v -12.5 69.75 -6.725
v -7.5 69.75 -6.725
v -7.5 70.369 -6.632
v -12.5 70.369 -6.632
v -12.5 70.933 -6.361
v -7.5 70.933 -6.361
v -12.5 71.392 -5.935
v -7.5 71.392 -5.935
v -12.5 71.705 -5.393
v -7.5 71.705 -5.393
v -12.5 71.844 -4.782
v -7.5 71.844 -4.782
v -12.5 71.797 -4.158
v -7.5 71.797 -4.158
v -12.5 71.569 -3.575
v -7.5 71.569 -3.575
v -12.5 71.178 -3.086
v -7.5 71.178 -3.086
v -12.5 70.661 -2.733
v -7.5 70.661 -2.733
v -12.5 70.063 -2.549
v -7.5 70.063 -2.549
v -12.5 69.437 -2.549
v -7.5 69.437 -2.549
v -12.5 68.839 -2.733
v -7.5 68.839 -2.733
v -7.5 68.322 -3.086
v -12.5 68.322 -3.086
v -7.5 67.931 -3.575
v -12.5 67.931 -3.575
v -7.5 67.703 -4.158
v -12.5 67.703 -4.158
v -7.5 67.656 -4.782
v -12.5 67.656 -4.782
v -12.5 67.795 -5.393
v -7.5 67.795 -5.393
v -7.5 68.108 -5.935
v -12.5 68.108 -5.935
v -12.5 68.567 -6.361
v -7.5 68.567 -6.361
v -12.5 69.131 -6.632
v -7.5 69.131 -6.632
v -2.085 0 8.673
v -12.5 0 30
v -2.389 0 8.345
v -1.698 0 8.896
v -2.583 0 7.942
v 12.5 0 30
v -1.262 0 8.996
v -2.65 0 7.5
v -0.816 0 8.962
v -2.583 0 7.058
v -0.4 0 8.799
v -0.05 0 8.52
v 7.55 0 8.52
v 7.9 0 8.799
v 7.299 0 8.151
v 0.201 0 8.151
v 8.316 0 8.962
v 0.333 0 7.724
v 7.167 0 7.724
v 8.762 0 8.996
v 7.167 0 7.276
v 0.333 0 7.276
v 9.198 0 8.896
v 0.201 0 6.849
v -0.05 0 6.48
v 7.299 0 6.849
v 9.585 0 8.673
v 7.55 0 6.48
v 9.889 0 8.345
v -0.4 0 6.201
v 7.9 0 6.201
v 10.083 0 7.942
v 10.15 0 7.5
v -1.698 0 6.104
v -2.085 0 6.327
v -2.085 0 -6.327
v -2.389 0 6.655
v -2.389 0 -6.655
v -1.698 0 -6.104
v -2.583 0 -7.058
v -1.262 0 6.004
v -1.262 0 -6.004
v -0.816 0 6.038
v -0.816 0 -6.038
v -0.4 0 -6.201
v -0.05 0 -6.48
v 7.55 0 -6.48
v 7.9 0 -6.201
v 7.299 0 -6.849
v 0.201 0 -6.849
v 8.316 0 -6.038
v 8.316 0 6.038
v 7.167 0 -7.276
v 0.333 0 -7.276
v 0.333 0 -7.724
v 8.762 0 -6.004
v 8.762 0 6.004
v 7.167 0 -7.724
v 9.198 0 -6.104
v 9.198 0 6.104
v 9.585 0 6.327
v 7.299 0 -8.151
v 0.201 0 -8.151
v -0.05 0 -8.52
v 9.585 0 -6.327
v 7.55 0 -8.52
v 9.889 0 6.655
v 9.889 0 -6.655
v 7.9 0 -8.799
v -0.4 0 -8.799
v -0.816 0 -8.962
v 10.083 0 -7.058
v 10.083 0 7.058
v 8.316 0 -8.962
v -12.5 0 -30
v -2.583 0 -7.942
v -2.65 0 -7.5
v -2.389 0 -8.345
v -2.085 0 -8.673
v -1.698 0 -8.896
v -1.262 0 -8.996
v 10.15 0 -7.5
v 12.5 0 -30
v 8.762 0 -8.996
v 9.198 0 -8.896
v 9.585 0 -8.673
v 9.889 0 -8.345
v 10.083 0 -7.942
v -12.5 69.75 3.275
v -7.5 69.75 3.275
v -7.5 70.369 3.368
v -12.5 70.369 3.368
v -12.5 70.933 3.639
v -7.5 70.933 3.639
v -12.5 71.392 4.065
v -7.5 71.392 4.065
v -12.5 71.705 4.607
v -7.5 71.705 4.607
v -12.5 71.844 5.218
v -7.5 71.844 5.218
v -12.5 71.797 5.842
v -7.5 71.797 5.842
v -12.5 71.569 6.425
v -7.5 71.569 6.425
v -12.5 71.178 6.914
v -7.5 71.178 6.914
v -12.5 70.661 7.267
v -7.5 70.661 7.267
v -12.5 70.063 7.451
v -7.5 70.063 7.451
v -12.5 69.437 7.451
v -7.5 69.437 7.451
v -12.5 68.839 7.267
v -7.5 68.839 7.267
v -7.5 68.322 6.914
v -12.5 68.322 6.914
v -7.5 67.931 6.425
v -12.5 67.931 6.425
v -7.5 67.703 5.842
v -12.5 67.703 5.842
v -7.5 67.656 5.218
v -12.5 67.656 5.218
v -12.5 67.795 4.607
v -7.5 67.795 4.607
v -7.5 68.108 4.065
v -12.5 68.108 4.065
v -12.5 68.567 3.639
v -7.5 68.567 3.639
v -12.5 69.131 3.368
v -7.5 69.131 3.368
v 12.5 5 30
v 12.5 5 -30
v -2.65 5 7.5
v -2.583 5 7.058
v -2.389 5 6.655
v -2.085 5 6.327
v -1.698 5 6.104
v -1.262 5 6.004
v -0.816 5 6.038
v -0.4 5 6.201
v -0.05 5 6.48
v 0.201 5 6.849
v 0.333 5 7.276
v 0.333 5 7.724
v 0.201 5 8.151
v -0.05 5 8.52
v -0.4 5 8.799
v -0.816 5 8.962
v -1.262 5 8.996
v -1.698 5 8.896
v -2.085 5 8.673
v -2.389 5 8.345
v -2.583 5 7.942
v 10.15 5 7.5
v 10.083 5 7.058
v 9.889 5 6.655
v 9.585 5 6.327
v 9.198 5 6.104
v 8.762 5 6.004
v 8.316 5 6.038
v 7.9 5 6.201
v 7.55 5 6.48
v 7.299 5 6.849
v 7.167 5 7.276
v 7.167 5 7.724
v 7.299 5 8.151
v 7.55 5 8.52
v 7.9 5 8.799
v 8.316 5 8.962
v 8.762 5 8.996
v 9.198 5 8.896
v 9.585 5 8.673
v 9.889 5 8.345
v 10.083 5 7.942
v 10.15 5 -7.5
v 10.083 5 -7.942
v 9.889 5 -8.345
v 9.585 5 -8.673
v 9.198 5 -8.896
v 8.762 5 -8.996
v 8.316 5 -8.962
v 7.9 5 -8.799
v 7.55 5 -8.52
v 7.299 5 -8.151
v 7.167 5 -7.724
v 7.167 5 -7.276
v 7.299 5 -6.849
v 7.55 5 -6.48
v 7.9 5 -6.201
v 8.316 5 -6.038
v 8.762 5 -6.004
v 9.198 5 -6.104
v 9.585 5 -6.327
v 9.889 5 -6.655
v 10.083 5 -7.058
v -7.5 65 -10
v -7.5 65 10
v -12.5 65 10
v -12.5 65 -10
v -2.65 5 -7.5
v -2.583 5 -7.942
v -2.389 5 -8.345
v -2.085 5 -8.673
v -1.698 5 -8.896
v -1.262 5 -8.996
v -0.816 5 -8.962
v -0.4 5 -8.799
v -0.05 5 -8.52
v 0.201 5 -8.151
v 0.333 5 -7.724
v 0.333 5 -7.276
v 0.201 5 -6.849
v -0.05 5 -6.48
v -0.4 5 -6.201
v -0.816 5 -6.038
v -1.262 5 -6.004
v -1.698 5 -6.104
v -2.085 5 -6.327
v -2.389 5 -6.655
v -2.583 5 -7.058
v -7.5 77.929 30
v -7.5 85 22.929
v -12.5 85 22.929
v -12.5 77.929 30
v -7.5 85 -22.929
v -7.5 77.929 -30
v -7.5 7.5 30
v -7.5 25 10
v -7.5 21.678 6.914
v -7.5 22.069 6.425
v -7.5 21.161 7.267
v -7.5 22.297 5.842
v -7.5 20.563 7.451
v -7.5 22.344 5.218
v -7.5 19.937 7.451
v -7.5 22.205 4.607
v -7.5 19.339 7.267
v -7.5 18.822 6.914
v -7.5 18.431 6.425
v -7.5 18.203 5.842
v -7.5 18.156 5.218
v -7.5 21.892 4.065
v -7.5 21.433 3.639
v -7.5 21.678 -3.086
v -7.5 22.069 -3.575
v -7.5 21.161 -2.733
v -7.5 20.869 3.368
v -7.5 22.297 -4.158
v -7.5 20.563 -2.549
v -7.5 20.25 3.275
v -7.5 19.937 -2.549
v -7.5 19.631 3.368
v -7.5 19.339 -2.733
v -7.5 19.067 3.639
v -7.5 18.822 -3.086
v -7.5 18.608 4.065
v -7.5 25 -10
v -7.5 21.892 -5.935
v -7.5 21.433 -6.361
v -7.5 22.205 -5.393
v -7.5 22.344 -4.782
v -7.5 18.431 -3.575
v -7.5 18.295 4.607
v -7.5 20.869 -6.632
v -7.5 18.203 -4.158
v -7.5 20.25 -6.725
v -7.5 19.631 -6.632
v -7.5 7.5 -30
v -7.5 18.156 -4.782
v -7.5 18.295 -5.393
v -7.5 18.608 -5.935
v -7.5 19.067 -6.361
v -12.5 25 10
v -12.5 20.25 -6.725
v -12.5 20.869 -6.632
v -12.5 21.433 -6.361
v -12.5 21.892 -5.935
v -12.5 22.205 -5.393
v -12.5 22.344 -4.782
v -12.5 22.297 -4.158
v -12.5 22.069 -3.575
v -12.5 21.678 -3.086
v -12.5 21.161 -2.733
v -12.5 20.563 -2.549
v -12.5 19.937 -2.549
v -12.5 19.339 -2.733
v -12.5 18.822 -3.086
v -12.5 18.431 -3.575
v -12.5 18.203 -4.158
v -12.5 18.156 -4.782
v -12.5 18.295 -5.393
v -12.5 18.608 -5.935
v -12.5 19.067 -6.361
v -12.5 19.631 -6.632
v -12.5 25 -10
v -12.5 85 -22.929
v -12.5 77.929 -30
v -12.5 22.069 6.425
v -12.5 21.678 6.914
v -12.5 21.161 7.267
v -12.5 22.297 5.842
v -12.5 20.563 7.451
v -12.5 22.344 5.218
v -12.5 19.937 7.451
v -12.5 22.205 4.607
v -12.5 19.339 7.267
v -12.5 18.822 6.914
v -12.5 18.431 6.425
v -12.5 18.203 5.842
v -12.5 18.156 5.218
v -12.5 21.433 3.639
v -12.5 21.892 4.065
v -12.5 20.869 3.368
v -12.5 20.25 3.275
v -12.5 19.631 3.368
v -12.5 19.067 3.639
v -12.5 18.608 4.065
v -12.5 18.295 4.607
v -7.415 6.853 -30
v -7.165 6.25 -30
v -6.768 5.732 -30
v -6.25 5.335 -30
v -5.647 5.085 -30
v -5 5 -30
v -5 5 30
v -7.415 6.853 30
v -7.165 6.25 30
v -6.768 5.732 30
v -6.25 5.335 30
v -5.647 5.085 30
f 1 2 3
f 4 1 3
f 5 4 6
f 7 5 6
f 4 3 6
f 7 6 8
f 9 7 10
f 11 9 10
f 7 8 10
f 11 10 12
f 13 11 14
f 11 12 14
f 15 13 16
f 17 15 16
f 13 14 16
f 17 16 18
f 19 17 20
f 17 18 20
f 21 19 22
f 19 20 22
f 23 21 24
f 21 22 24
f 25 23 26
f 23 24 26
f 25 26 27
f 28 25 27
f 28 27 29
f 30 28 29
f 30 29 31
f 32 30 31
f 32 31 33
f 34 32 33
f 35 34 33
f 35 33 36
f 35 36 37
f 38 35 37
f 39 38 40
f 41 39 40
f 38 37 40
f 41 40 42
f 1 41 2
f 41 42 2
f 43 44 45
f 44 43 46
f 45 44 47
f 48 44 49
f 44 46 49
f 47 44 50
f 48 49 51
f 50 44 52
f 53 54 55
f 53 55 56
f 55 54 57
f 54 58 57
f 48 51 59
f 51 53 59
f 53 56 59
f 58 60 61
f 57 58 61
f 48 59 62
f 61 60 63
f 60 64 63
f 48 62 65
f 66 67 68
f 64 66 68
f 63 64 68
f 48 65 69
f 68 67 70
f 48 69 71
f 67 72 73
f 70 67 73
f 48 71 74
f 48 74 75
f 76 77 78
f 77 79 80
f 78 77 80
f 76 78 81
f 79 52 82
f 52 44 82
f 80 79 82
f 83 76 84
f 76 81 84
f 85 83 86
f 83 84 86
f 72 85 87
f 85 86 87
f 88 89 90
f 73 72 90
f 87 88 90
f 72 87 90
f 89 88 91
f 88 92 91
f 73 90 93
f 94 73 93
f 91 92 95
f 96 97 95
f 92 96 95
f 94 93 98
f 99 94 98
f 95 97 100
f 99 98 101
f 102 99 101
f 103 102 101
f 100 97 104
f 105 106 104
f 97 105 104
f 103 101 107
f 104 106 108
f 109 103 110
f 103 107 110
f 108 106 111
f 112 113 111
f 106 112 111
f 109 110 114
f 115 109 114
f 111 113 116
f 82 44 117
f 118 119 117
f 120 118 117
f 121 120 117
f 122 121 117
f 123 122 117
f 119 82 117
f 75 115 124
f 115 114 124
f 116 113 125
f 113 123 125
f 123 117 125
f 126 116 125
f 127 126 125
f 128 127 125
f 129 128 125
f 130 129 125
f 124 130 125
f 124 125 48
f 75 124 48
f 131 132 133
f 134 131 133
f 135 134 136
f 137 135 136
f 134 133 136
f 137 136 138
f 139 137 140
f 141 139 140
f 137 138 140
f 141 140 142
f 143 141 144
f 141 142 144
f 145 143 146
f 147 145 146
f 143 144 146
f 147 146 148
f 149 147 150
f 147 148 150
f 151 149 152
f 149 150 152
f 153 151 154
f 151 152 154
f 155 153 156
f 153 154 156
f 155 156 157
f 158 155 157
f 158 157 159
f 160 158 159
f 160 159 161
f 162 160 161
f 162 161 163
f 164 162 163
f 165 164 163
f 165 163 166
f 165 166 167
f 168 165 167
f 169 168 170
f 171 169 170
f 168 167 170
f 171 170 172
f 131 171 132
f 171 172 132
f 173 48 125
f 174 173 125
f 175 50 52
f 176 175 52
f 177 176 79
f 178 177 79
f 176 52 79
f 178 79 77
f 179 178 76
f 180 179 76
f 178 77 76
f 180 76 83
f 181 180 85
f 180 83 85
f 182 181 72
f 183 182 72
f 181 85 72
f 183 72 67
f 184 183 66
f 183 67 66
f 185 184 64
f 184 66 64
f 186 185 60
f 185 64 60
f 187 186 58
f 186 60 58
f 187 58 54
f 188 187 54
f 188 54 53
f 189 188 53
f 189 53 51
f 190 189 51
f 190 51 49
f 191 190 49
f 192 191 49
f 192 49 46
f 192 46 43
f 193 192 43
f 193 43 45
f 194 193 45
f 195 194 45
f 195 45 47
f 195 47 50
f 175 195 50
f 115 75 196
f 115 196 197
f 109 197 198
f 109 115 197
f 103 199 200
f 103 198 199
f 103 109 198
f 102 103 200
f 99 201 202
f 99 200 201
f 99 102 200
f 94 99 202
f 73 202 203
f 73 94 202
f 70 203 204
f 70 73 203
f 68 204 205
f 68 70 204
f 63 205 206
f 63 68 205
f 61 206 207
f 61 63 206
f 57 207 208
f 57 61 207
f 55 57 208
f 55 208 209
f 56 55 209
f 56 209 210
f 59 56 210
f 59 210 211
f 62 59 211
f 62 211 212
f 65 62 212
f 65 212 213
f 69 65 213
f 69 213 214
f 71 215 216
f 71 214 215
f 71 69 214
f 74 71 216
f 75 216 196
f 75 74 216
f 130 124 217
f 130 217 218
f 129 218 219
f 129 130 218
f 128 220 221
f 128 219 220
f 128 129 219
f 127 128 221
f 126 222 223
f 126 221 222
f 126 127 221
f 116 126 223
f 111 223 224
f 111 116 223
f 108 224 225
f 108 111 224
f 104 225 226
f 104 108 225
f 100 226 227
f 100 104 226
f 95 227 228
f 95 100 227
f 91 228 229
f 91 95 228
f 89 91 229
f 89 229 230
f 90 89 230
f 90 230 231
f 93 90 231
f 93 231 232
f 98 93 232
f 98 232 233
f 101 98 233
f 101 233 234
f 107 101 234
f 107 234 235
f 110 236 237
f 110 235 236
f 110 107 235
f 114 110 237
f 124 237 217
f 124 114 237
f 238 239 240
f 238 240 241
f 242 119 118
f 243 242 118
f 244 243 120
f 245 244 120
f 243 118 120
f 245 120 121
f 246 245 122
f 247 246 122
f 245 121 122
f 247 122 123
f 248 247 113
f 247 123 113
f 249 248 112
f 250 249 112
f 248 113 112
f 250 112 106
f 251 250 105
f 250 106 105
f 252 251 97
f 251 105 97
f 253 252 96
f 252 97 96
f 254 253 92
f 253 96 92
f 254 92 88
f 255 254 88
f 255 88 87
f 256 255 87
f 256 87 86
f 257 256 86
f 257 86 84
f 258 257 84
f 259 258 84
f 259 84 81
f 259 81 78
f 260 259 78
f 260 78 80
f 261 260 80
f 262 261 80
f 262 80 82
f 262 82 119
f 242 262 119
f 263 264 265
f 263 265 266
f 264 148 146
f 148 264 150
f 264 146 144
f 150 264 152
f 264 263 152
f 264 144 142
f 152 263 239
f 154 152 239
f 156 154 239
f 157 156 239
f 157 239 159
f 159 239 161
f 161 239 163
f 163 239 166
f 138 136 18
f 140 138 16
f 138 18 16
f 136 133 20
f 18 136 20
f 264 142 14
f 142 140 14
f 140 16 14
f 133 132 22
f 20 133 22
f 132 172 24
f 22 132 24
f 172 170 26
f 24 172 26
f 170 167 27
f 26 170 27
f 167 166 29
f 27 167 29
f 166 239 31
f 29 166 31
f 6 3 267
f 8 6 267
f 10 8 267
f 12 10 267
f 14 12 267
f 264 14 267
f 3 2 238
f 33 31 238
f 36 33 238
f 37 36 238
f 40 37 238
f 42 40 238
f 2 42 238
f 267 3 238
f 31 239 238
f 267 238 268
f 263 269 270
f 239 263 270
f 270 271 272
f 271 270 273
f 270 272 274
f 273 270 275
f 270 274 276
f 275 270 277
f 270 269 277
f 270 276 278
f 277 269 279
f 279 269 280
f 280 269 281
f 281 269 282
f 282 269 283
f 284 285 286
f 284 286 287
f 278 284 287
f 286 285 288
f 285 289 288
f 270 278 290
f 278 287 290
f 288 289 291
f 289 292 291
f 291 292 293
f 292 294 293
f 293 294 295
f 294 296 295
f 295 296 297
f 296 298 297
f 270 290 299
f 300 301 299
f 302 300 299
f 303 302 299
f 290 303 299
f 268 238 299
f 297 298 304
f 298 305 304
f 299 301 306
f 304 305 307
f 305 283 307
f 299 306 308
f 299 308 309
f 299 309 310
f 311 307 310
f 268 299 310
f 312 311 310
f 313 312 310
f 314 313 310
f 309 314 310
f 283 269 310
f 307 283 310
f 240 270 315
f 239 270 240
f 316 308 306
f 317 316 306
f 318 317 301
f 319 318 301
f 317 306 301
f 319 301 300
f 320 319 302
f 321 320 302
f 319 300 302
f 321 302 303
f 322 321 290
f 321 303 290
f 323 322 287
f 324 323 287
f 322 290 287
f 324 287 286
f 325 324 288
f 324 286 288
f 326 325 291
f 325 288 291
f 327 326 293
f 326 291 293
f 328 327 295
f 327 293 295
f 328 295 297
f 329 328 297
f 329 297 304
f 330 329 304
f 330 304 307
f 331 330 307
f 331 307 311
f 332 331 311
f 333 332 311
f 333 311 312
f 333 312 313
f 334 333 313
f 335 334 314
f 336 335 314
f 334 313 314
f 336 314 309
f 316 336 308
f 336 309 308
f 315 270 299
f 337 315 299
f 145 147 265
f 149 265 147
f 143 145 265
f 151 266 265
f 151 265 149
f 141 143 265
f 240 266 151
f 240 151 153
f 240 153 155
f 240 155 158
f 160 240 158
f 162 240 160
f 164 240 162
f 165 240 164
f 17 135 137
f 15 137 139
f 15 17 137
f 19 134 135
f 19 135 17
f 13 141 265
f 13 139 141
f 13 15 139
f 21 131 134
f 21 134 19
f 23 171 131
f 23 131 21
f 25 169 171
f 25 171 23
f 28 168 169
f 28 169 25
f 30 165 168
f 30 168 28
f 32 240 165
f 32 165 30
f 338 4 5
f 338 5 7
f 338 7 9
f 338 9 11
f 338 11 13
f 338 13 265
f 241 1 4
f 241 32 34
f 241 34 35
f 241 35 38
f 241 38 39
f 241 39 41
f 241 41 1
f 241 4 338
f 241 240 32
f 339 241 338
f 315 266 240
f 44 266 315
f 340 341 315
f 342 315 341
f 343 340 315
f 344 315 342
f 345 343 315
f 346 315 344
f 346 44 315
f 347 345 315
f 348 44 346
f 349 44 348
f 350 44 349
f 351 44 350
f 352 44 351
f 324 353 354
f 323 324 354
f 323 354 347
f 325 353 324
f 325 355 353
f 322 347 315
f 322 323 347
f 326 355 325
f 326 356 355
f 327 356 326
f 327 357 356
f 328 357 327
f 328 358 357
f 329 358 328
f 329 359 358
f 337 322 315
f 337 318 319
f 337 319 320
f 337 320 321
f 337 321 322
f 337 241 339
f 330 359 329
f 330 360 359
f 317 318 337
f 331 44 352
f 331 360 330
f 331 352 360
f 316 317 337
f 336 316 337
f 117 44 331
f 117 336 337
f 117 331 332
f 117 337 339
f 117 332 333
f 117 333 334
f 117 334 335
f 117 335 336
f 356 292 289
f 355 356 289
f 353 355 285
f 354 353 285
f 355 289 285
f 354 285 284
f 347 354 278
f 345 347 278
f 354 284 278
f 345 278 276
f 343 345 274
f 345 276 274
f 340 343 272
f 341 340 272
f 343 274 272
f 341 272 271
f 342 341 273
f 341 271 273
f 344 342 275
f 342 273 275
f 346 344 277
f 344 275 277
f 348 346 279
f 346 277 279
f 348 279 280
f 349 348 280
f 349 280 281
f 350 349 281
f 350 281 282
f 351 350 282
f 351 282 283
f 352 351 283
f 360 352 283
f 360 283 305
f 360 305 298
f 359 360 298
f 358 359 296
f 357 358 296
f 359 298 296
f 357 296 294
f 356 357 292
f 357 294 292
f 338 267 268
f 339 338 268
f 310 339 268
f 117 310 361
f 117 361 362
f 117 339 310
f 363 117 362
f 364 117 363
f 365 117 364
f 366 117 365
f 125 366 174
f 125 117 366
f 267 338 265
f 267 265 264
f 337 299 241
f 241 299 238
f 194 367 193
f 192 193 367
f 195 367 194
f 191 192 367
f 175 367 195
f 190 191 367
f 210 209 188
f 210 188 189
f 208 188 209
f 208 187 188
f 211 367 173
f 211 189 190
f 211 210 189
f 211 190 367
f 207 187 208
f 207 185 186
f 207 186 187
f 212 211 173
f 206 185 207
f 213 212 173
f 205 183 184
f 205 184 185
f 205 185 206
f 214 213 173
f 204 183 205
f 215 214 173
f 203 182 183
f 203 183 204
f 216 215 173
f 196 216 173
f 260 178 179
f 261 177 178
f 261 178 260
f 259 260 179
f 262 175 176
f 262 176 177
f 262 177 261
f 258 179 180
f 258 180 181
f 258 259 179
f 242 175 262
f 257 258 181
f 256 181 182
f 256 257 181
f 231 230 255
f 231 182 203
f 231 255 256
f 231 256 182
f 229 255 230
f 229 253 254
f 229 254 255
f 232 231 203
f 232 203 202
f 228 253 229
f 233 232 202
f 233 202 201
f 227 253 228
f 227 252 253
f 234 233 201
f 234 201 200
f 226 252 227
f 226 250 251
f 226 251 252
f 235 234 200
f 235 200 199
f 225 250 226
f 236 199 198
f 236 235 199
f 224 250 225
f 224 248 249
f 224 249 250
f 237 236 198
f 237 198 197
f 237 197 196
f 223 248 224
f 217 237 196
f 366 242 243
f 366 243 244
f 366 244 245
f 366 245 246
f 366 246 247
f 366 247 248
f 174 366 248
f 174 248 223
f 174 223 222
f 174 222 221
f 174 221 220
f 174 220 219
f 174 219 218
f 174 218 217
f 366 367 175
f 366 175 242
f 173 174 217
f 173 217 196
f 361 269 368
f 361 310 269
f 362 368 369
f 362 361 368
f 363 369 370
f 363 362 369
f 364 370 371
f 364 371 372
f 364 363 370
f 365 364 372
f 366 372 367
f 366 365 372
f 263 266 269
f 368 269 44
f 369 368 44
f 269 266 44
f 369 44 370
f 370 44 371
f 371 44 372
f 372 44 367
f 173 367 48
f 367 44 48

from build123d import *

# Parameters (mm, degrees)
SKETCH1_W             = 25
SKETCH1_H             = 60
BOSS_EXTRUDE1_DEPTH   = 5
SKETCH8_W             = 5
SKETCH8_H             = 60
BOSS_EXTRUDE2_DEPTH   = 80
SKETCH9_R             = 2.1
SKETCH9_W             = 20
SKETCH9_H             = 40
CUT_EXTRUDE1_DEPTH    = 5
CUT_EXTRUDE2_REACH    = 7
FILLET1_R             = 2.5
F_3_0MM_DOWEL_HOLE1_D = 3


with BuildPart() as part:
    # Sketch1 → Boss-Extrude1 (new body)
    with BuildSketch(Plane(origin=(0, 0, 0), x_dir=(1, 0, 0), z_dir=(0, 1, 0))):
        Rectangle(SKETCH1_W, SKETCH1_H)
    extrude(amount=BOSS_EXTRUDE1_DEPTH)

    # Sketch8 → Boss-Extrude2 (add)
    with BuildSketch(Plane(origin=(0, 5, 0), x_dir=(1, 0, 0), z_dir=(0, 1, 0))):
        with Locations((-10, 0)):
            Rectangle(SKETCH8_W, SKETCH8_H)
    extrude(amount=BOSS_EXTRUDE2_DEPTH)

    # Sketch9 → Cut-Extrude1 (cut)
    with BuildSketch(Plane(origin=(-7.5, 0, 0), x_dir=(0, 0, -1), z_dir=(1, 0, 0))):
        with Locations((-5.37452771, 69.75)):
            Circle(SKETCH9_R)
        with Locations((4.62547229, 69.75)):
            Circle(SKETCH9_R)
        with Locations((-5.37452771, 20.25)):
            Circle(SKETCH9_R)
        with Locations((4.62547229, 20.25)):
            Circle(SKETCH9_R)
        with Locations((0, 45)):
            Rectangle(SKETCH9_W, SKETCH9_H)
    extrude(amount=-CUT_EXTRUDE1_DEPTH, mode=Mode.SUBTRACT)

    # Sketch10 → Cut-Extrude2 (cut, up to next)
    with BuildSketch(Plane(origin=(-7.5, 0, 0), x_dir=(0, 0, -1), z_dir=(1, 0, 0)), mode=Mode.PRIVATE) as cut_extrude2_sk1:
        Polygon((-22.928932188, 85), (-30, 77.928932188), (-30, 85), align=None)
    cut_extrude2_tool1 = extrude(cut_extrude2_sk1.sketch, amount=-CUT_EXTRUDE2_REACH, mode=Mode.PRIVATE) & part.part
    add(cut_extrude2_tool1.solids().sort_by_distance((-7.5, 82.642977, 27.642977))[0], mode=Mode.SUBTRACT)
    # Sketch10 → Cut-Extrude2 (cut, up to next)
    with BuildSketch(Plane(origin=(-7.5, 0, 0), x_dir=(0, 0, -1), z_dir=(1, 0, 0)), mode=Mode.PRIVATE) as cut_extrude2_sk2:
        Polygon((22.928932188, 85), (30, 77.928932188), (30, 85), align=None)
    cut_extrude2_tool2 = extrude(cut_extrude2_sk2.sketch, amount=-CUT_EXTRUDE2_REACH, mode=Mode.PRIVATE) & part.part
    add(cut_extrude2_tool2.solids().sort_by_distance((-7.5, 82.642977, -27.642977))[0], mode=Mode.SUBTRACT)

    # Fillet1
    fillet1_edges = [part.edges().sort_by_distance(p)[0] for p in [
        (-7.5, 5, 0),
    ]]
    fillet(fillet1_edges, radius=FILLET1_R)

    # Ø3.0mm Dowel Hole1 (through all)
    with Locations(Plane(origin=(0, 5, 0), x_dir=(1, 0, 0), z_dir=(0, 1, 0))):
        with Locations((-1.15, 7.5), (-1.15, -7.5)):
            f_3_0mm_dowel_hole1 = Hole(F_3_0MM_DOWEL_HOLE1_D / 2)

    # Mirror1: Ø3.0mm Dowel Hole1 across plane
    add(f_3_0mm_dowel_hole1.mirror(Plane(origin=(3.75, 0, 0), x_dir=(0, 0, 1), z_dir=(1, 0, 0))), mode=Mode.SUBTRACT)


solid = part.part
